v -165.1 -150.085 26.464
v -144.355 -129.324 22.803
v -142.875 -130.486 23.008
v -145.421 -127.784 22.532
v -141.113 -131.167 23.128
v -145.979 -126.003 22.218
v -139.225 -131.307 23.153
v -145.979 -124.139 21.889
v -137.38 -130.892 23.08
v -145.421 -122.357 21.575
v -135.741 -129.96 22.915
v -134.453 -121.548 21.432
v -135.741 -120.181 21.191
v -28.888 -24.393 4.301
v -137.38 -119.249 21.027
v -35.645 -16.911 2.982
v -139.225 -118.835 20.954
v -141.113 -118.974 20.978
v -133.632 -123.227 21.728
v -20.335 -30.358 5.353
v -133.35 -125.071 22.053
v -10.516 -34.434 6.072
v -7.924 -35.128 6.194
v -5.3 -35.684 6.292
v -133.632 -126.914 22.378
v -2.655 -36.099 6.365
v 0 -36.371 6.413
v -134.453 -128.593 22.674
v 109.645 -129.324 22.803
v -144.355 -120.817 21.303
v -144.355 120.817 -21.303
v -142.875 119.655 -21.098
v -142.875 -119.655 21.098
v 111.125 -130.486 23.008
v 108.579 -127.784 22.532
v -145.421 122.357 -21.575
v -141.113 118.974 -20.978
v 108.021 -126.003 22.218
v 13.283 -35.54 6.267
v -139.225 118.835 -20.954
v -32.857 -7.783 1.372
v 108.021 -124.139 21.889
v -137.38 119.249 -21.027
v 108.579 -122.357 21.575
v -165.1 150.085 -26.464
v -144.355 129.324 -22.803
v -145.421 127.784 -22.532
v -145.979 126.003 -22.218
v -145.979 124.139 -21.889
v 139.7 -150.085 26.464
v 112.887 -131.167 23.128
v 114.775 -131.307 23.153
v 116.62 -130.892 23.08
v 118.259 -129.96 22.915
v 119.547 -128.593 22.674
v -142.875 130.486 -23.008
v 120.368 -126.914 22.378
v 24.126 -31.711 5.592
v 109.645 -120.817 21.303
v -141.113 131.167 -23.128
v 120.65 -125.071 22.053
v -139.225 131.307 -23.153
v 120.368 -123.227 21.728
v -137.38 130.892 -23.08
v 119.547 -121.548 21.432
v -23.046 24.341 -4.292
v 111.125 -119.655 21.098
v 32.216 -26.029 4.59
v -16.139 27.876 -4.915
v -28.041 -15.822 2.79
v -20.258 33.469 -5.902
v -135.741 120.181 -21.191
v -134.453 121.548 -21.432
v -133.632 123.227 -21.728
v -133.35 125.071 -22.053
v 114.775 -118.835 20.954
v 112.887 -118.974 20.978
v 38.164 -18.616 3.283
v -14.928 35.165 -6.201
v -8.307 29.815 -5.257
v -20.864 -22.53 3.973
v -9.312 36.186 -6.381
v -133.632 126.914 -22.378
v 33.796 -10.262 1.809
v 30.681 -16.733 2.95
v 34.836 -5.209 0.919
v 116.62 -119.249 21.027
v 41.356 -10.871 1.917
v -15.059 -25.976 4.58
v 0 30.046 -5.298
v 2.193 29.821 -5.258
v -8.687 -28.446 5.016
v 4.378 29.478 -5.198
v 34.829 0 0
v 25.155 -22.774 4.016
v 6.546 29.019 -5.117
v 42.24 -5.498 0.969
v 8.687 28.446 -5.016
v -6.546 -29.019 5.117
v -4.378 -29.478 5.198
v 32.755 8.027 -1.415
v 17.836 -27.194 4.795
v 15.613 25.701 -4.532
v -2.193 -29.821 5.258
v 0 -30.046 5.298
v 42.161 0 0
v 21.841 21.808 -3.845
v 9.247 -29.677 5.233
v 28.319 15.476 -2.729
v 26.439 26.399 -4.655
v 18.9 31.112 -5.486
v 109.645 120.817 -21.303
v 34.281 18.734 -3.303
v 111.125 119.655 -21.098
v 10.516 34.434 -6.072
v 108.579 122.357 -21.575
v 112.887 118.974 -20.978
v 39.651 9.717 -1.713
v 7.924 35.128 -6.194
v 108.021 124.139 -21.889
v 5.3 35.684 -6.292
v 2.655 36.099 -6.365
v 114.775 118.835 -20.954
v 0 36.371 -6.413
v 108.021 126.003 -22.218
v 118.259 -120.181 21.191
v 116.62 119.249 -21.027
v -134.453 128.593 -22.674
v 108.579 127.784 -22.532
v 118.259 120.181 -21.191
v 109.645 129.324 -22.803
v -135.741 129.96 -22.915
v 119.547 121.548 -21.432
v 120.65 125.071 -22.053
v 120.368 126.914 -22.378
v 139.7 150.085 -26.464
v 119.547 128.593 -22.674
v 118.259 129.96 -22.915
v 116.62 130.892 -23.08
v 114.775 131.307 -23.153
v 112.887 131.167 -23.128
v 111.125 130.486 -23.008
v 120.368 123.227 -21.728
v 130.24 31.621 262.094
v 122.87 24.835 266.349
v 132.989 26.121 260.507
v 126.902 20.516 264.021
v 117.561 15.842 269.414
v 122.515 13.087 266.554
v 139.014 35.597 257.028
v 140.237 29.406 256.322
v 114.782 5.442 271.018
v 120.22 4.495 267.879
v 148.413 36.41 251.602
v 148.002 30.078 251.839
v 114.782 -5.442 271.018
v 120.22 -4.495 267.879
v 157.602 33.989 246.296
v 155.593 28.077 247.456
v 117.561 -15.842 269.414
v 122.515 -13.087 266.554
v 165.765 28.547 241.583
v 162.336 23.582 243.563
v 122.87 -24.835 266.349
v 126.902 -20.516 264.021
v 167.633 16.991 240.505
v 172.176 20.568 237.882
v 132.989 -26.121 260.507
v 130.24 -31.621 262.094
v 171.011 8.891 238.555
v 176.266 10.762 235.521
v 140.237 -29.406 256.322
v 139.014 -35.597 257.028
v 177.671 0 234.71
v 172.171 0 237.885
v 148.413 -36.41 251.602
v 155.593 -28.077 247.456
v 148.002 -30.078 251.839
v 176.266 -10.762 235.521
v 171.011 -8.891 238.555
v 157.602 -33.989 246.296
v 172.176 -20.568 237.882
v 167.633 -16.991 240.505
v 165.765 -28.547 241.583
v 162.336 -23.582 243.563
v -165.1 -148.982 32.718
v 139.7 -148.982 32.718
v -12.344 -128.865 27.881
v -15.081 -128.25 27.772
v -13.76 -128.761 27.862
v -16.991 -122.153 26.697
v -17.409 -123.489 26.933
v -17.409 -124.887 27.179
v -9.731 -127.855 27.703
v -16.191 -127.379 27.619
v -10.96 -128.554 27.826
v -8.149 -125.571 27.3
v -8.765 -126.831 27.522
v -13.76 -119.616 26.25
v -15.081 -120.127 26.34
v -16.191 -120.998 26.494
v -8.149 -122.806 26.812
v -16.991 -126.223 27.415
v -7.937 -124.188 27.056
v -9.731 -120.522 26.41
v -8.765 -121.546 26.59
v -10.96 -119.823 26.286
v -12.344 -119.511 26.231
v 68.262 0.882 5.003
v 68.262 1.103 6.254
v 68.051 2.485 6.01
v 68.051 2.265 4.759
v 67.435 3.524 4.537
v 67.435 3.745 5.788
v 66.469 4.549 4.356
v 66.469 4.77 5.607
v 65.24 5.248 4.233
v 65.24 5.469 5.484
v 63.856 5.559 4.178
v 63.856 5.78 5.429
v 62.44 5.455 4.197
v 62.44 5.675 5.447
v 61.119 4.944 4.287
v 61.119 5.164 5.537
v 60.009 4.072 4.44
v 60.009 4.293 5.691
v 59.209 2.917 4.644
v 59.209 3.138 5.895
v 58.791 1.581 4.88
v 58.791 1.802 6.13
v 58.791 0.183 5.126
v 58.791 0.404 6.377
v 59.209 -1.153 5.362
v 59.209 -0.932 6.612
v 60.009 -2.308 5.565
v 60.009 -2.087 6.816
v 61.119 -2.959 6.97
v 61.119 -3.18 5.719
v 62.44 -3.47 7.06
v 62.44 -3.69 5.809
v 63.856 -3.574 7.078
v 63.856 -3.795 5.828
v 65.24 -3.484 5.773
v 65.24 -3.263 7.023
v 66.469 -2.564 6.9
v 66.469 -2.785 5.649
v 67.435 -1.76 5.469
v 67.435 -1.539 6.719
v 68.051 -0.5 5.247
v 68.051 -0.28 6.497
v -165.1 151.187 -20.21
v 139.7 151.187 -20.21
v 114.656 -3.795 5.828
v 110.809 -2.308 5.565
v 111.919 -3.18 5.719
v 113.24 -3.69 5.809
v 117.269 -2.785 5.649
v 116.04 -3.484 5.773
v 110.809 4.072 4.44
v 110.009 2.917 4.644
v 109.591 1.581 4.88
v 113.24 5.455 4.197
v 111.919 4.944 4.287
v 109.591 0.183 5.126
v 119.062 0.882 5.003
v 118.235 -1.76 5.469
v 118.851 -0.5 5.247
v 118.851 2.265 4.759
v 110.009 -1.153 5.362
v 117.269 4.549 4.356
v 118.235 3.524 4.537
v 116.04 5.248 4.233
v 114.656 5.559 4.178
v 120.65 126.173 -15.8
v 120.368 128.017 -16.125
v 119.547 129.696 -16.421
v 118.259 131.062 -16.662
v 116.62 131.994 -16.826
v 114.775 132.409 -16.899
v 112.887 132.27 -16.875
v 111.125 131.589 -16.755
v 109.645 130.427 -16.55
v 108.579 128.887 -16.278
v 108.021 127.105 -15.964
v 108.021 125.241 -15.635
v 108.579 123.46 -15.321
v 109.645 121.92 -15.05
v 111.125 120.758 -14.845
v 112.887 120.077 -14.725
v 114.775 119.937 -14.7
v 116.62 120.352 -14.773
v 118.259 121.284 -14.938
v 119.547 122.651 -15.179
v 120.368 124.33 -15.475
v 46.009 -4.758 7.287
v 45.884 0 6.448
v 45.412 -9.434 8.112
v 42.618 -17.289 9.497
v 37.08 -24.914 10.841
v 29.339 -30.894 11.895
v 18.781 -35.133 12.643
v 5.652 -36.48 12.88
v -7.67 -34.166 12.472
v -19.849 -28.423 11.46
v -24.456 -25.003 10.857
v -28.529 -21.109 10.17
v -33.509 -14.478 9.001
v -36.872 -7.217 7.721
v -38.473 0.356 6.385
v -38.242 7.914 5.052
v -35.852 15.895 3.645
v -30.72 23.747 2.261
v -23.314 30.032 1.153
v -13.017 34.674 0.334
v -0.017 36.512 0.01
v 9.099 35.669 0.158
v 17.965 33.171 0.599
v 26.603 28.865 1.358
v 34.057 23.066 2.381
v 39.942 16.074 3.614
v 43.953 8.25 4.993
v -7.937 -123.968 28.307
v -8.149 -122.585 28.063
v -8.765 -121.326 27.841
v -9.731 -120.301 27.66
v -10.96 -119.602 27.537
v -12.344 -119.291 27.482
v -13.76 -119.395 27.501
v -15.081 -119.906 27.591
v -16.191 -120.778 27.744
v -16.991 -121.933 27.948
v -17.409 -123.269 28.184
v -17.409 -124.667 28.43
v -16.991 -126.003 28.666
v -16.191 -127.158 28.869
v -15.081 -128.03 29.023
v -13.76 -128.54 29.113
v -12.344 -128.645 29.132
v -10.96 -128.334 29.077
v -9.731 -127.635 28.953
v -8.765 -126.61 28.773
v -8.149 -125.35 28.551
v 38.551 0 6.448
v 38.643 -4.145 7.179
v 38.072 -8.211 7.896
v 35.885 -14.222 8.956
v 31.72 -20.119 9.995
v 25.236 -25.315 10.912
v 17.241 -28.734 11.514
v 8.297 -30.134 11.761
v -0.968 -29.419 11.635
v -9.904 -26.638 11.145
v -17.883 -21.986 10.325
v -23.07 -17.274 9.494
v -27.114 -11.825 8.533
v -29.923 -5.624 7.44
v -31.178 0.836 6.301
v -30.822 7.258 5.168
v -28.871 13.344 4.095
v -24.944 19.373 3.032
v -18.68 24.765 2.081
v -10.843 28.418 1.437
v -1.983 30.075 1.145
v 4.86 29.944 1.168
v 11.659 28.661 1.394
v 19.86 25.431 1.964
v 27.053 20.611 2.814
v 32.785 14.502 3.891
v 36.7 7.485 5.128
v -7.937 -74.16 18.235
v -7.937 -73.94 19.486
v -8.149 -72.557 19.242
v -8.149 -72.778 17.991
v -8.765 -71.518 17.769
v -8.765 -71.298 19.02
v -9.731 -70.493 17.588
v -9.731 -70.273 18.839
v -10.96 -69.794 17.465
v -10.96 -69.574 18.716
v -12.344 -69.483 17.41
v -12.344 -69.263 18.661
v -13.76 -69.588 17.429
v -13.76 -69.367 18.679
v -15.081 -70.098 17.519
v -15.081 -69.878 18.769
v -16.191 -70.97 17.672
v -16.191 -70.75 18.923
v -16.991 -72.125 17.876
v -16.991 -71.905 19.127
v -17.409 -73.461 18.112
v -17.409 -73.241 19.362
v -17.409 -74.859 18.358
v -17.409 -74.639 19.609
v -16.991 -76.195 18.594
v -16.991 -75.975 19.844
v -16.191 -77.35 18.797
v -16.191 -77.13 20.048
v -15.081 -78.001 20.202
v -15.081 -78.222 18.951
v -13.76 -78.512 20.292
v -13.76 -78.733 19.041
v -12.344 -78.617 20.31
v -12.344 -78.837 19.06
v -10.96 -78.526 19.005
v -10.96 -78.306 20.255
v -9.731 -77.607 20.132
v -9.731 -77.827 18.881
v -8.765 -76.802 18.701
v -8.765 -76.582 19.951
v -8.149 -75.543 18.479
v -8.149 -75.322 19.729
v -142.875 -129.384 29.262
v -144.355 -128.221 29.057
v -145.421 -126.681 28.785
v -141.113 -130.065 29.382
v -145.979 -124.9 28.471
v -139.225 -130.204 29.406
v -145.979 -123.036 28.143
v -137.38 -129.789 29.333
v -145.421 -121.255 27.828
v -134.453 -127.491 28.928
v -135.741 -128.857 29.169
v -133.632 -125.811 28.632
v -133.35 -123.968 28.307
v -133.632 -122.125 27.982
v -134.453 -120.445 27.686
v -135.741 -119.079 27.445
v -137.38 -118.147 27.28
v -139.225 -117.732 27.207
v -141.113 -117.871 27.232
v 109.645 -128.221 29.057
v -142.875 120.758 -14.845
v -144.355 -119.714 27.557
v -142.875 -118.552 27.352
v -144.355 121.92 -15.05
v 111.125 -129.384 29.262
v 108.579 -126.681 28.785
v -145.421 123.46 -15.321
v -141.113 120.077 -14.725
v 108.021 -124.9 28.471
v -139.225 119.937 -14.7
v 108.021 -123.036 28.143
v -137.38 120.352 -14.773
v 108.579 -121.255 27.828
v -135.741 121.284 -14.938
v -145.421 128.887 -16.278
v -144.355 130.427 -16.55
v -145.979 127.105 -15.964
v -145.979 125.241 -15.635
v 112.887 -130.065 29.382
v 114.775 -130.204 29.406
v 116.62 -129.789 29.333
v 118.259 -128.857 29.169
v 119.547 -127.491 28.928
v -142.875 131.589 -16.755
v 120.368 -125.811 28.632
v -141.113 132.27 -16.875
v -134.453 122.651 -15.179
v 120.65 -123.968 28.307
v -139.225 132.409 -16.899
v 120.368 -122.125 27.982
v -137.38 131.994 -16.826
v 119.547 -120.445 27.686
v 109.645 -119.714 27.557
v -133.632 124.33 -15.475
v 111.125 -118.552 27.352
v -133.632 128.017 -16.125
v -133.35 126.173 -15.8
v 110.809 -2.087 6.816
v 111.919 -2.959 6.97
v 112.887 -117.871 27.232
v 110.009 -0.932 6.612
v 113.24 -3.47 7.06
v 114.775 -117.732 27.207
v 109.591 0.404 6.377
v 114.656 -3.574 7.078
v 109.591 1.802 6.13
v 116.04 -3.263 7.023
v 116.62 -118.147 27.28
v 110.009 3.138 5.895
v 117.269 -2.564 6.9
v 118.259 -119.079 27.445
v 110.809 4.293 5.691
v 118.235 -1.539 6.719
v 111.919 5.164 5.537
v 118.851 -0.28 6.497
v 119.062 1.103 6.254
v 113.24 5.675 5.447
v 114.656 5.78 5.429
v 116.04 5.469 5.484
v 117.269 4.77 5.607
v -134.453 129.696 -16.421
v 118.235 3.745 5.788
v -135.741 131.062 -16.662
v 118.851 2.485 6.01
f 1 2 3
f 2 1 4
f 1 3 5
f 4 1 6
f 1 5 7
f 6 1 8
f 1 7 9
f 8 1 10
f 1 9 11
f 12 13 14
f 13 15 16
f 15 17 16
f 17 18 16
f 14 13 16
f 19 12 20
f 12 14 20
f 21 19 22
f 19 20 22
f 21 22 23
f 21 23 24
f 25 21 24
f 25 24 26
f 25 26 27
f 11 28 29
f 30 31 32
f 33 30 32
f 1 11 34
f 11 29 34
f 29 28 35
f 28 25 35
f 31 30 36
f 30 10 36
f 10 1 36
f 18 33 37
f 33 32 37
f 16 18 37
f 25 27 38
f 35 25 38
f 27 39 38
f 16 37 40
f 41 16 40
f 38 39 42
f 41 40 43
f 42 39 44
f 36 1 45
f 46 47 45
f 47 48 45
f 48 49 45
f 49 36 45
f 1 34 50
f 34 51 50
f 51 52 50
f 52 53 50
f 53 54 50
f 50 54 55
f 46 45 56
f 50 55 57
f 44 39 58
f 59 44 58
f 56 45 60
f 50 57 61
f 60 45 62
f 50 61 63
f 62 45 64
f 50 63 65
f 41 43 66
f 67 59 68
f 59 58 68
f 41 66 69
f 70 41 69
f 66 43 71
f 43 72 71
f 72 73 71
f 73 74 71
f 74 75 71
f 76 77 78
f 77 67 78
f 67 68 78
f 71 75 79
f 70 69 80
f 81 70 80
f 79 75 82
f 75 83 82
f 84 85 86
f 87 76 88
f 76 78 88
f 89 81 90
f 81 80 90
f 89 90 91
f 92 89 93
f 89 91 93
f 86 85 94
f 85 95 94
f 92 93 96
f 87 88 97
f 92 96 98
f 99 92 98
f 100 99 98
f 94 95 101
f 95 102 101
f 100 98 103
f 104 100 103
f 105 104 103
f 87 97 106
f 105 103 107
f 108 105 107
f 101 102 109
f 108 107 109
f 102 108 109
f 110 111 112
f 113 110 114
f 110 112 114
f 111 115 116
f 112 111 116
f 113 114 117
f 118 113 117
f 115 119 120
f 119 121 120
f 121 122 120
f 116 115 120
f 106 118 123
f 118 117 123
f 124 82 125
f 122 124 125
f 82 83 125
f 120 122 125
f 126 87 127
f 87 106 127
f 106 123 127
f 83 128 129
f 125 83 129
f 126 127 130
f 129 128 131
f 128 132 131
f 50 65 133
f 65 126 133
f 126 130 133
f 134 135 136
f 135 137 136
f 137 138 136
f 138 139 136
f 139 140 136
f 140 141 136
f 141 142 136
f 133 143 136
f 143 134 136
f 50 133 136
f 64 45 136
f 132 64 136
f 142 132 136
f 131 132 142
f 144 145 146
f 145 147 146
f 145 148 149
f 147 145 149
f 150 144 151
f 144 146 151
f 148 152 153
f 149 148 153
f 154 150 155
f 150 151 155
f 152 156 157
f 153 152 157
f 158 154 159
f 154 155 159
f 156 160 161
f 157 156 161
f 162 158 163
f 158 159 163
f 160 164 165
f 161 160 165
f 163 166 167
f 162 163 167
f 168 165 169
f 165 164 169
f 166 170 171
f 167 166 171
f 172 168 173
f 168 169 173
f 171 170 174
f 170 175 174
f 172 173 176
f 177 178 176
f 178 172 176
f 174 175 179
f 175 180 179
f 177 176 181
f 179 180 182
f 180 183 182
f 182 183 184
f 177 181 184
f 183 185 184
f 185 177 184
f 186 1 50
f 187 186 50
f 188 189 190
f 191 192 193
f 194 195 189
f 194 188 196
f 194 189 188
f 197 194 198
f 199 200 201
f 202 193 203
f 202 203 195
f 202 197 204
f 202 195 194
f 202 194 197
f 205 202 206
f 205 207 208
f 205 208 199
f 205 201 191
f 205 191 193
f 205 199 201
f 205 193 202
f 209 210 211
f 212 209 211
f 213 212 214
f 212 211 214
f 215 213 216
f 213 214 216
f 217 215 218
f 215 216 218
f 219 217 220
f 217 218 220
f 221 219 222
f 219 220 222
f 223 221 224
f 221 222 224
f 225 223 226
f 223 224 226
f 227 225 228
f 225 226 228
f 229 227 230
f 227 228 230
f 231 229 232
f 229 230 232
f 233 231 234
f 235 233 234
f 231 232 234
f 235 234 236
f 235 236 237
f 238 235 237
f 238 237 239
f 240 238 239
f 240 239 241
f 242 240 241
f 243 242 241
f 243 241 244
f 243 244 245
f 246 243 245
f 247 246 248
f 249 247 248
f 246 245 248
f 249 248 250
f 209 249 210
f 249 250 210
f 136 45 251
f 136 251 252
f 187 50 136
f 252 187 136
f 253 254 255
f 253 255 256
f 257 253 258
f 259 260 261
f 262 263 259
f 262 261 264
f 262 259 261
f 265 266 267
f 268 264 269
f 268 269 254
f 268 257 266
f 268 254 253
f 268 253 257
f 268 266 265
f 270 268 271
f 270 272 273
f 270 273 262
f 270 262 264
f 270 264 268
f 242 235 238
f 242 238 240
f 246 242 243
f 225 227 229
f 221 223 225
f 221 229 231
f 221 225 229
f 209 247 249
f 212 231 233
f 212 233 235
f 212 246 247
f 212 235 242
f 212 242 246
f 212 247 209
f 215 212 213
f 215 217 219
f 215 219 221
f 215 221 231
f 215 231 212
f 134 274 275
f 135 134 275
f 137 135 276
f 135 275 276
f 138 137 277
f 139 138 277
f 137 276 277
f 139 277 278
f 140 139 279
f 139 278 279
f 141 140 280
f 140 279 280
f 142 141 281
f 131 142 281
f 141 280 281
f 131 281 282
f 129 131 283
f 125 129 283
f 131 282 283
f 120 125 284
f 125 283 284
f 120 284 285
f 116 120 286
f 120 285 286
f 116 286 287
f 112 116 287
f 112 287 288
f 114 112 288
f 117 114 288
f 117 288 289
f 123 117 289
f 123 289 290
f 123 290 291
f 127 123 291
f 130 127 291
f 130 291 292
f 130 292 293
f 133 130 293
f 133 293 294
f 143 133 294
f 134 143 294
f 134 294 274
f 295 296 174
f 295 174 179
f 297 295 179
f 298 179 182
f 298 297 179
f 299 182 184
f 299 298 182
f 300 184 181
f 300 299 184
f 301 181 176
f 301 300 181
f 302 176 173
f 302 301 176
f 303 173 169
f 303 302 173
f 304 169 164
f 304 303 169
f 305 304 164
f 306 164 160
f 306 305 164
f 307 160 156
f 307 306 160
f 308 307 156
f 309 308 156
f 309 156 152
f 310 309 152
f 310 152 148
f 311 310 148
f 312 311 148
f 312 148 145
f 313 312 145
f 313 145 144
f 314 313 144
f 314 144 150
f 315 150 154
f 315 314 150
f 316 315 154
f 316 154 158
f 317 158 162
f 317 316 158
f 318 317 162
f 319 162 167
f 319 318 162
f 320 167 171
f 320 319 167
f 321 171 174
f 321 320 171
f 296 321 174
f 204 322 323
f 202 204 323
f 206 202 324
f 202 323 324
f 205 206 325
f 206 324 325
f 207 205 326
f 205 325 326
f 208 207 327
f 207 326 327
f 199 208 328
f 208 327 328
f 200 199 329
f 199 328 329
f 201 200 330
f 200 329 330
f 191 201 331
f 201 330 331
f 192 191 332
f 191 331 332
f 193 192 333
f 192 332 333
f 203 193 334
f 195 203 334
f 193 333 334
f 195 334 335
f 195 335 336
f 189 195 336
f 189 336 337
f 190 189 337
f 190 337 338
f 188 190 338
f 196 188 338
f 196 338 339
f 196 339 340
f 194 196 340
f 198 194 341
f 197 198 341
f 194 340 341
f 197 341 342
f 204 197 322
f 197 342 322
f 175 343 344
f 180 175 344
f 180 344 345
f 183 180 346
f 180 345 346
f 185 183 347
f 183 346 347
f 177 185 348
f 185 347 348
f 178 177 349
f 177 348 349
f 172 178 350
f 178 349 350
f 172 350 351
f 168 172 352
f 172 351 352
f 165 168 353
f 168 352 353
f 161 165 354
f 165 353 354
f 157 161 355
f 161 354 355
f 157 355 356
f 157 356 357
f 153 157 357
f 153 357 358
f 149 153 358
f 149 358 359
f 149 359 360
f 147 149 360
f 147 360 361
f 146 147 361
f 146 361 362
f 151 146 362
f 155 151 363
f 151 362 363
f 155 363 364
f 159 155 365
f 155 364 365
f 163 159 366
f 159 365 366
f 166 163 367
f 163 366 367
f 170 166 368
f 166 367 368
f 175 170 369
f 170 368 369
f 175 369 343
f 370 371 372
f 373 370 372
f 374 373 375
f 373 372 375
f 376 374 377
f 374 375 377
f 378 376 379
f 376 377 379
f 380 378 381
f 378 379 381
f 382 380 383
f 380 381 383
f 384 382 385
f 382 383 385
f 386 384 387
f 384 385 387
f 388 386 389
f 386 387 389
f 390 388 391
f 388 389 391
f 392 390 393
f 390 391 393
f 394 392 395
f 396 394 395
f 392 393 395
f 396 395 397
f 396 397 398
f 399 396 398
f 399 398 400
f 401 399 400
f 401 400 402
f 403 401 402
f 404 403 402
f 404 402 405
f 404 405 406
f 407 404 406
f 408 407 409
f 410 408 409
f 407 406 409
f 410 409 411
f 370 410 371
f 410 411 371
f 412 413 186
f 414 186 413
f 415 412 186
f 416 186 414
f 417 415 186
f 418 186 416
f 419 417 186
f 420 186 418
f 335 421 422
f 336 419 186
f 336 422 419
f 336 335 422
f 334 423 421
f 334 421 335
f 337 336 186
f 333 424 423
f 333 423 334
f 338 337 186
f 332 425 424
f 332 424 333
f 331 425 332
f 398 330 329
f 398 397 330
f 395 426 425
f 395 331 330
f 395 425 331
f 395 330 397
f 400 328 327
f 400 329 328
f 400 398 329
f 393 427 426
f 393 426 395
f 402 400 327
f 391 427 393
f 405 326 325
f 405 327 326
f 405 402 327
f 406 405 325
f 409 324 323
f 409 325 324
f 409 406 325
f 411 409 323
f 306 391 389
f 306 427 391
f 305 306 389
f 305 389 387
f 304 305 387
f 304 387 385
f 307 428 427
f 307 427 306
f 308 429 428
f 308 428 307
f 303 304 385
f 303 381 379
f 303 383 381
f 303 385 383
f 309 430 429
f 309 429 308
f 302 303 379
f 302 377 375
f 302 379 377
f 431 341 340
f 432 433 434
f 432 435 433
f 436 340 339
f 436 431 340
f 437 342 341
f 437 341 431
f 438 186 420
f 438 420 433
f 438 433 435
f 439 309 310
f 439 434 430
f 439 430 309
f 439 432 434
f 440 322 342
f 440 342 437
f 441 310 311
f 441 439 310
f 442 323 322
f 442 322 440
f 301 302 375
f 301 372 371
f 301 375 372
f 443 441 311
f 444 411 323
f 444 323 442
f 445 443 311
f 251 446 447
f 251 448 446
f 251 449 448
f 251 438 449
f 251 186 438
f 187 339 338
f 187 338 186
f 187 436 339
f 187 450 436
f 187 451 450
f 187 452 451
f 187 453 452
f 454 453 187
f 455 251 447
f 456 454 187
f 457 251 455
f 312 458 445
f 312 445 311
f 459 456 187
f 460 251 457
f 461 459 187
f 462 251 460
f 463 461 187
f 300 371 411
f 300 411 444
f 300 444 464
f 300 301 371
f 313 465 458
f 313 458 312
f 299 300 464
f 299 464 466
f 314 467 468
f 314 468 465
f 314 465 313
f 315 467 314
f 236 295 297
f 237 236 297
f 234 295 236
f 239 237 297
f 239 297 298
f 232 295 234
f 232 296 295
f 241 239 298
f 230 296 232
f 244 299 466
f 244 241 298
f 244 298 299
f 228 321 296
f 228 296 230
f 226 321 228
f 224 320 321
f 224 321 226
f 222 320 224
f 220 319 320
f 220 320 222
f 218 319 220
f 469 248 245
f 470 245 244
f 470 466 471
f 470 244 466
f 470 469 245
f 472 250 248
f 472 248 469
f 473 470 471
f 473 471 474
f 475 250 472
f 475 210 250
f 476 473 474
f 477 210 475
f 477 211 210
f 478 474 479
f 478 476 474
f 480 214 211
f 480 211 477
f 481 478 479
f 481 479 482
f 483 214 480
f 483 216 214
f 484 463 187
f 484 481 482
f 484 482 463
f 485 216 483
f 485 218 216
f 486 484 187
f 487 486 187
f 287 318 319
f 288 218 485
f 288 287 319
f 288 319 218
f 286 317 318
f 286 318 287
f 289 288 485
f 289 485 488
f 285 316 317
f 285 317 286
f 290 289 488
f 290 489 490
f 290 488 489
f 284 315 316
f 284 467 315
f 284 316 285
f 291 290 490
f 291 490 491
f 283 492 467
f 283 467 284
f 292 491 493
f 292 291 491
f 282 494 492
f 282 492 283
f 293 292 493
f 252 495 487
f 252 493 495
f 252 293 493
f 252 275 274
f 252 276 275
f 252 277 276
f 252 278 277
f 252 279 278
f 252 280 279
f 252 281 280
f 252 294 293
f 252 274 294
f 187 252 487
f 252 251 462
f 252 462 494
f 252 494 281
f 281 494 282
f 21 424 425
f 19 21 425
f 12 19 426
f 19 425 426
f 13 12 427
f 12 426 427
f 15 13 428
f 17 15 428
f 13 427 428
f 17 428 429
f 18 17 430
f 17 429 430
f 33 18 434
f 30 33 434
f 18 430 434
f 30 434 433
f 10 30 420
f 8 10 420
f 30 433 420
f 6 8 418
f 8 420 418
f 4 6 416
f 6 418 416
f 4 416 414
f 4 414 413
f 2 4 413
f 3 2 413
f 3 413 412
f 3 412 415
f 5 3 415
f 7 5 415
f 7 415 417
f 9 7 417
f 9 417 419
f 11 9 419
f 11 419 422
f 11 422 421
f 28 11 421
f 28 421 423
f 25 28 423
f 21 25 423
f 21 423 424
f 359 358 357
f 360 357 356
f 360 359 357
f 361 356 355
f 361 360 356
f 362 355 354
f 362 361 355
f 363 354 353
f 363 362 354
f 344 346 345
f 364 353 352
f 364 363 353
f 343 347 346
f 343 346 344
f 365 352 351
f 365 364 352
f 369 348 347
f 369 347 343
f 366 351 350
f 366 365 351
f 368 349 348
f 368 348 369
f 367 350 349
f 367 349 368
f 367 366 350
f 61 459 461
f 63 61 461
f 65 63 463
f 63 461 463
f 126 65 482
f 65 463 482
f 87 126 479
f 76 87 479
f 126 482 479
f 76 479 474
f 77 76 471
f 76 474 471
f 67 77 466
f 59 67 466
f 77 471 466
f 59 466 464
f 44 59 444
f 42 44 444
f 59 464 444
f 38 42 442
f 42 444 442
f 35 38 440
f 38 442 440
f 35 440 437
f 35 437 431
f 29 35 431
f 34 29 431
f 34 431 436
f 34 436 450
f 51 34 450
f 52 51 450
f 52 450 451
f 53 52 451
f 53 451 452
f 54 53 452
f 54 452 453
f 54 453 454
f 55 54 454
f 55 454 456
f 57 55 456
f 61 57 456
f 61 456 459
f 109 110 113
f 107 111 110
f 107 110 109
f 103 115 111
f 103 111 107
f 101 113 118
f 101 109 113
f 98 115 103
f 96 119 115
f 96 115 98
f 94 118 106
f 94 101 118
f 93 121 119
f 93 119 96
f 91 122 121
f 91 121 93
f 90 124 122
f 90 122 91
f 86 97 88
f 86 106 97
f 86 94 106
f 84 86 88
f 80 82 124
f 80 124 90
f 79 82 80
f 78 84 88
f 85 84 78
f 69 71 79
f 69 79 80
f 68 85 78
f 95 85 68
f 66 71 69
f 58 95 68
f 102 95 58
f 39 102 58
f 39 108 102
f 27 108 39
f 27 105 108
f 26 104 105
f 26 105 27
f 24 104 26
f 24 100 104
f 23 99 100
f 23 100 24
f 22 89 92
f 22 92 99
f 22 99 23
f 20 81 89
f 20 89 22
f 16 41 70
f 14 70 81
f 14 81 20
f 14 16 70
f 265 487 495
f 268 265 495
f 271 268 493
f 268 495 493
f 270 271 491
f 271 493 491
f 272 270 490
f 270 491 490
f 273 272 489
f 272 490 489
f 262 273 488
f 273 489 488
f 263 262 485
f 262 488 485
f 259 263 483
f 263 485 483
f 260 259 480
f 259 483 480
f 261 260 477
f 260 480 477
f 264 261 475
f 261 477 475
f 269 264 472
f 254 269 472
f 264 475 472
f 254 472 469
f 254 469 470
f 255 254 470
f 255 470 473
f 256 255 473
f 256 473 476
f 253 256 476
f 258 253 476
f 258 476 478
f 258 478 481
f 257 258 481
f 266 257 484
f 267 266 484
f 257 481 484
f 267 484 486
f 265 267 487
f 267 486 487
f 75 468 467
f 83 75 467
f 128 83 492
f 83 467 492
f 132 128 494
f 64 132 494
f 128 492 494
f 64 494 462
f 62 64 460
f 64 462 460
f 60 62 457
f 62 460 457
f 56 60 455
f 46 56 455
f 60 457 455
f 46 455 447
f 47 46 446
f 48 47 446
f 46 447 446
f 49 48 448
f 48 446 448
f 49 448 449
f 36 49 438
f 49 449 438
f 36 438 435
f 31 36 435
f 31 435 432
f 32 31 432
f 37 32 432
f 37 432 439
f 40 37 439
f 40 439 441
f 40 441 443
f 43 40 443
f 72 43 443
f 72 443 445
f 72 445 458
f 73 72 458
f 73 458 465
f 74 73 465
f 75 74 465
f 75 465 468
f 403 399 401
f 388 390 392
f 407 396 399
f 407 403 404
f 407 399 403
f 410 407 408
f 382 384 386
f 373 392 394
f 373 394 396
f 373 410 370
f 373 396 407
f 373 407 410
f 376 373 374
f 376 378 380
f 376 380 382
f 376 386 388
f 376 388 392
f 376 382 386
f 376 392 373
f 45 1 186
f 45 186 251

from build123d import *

# Parameters (mm, degrees)
F2_W          = 304.8
F2_H          = 304.8
F3_DEPTH      = 6.35
F5_R          = 36.5125
F5_R_2        = 30.1625
F6_DEPTH      = 292.1
F6_DEPTH_BACK = 15.24
F8_DEPTH      = 50.8
F8_DEPTH_BACK = 50.8
F9_R          = 4.7625
F10_DEPTH     = 1.27
F11_R         = 6.35
F12_DEPTH     = 25.4


with BuildPart() as f3:
    # F2 (on line) → F3 (new body)
    with BuildSketch(Plane(origin=(0, 0, 0), x_dir=(1, 0, 0), z_dir=(0, 0.1736481777, 0.984807753))):
        with Locations((-12.7, 0)):
            Rectangle(F2_W, F2_H)
    extrude(amount=F3_DEPTH)

    # F5 (on line) → F6 (join, two sides)
    with BuildSketch(Plane(origin=(0, 0, 0), x_dir=(0.8660254038, 0, -0.5), z_dir=(-0.5, 0, -0.8660254038))) as f6_sk:
        Circle(F5_R)
        Circle(F5_R_2, mode=Mode.SUBTRACT)
    extrude(amount=-F6_DEPTH)
    extrude(f6_sk.sketch, amount=F6_DEPTH_BACK)

    # F7 (on Right) → F8 (cut, two sides)
    with BuildSketch(Plane.YZ) as f8_sk:
        Polygon((47.014611039, -36.6175852823), (47.014611039, -8.2899444137), (-48.9987151589, 8.6397955026), (-48.9987151589, -36.6175852823), align=None)
    extrude(amount=-F8_DEPTH, mode=Mode.SUBTRACT)
    extrude(f8_sk.sketch, amount=F8_DEPTH_BACK, mode=Mode.SUBTRACT)

    # F9 (on face) → F10 (cut)
    with BuildSketch(Plane(origin=(0, 1.1026659282, 6.2535292316), x_dir=(1, 0, 0), z_dir=(0, 0.1736481777, 0.984807753))):
        with Locations((114.3, 0)):
            Circle(F9_R)
        with Locations((-12.7, -76.2)):
            Circle(F9_R)
        with Locations((63.5, 0)):
            Circle(F9_R)
        with Locations((-12.7, -127)):
            Circle(F9_R)
    extrude(amount=-F10_DEPTH, mode=Mode.SUBTRACT)

    # F11 (on face) → F12 (cut)
    with BuildSketch(Plane(origin=(0, 1.1026659282, 6.2535292316), x_dir=(1, 0, 0), z_dir=(0, 0.1736481777, 0.984807753))):
        with Locations((-139.7, 127)):
            Circle(F11_R)
        with Locations((114.3, 127)):
            Circle(F11_R)
        with Locations((114.3, -127)):
            Circle(F11_R)
        with Locations((-139.7, -127)):
            Circle(F11_R)
    extrude(amount=-F12_DEPTH, mode=Mode.SUBTRACT)


solid = f3.part
